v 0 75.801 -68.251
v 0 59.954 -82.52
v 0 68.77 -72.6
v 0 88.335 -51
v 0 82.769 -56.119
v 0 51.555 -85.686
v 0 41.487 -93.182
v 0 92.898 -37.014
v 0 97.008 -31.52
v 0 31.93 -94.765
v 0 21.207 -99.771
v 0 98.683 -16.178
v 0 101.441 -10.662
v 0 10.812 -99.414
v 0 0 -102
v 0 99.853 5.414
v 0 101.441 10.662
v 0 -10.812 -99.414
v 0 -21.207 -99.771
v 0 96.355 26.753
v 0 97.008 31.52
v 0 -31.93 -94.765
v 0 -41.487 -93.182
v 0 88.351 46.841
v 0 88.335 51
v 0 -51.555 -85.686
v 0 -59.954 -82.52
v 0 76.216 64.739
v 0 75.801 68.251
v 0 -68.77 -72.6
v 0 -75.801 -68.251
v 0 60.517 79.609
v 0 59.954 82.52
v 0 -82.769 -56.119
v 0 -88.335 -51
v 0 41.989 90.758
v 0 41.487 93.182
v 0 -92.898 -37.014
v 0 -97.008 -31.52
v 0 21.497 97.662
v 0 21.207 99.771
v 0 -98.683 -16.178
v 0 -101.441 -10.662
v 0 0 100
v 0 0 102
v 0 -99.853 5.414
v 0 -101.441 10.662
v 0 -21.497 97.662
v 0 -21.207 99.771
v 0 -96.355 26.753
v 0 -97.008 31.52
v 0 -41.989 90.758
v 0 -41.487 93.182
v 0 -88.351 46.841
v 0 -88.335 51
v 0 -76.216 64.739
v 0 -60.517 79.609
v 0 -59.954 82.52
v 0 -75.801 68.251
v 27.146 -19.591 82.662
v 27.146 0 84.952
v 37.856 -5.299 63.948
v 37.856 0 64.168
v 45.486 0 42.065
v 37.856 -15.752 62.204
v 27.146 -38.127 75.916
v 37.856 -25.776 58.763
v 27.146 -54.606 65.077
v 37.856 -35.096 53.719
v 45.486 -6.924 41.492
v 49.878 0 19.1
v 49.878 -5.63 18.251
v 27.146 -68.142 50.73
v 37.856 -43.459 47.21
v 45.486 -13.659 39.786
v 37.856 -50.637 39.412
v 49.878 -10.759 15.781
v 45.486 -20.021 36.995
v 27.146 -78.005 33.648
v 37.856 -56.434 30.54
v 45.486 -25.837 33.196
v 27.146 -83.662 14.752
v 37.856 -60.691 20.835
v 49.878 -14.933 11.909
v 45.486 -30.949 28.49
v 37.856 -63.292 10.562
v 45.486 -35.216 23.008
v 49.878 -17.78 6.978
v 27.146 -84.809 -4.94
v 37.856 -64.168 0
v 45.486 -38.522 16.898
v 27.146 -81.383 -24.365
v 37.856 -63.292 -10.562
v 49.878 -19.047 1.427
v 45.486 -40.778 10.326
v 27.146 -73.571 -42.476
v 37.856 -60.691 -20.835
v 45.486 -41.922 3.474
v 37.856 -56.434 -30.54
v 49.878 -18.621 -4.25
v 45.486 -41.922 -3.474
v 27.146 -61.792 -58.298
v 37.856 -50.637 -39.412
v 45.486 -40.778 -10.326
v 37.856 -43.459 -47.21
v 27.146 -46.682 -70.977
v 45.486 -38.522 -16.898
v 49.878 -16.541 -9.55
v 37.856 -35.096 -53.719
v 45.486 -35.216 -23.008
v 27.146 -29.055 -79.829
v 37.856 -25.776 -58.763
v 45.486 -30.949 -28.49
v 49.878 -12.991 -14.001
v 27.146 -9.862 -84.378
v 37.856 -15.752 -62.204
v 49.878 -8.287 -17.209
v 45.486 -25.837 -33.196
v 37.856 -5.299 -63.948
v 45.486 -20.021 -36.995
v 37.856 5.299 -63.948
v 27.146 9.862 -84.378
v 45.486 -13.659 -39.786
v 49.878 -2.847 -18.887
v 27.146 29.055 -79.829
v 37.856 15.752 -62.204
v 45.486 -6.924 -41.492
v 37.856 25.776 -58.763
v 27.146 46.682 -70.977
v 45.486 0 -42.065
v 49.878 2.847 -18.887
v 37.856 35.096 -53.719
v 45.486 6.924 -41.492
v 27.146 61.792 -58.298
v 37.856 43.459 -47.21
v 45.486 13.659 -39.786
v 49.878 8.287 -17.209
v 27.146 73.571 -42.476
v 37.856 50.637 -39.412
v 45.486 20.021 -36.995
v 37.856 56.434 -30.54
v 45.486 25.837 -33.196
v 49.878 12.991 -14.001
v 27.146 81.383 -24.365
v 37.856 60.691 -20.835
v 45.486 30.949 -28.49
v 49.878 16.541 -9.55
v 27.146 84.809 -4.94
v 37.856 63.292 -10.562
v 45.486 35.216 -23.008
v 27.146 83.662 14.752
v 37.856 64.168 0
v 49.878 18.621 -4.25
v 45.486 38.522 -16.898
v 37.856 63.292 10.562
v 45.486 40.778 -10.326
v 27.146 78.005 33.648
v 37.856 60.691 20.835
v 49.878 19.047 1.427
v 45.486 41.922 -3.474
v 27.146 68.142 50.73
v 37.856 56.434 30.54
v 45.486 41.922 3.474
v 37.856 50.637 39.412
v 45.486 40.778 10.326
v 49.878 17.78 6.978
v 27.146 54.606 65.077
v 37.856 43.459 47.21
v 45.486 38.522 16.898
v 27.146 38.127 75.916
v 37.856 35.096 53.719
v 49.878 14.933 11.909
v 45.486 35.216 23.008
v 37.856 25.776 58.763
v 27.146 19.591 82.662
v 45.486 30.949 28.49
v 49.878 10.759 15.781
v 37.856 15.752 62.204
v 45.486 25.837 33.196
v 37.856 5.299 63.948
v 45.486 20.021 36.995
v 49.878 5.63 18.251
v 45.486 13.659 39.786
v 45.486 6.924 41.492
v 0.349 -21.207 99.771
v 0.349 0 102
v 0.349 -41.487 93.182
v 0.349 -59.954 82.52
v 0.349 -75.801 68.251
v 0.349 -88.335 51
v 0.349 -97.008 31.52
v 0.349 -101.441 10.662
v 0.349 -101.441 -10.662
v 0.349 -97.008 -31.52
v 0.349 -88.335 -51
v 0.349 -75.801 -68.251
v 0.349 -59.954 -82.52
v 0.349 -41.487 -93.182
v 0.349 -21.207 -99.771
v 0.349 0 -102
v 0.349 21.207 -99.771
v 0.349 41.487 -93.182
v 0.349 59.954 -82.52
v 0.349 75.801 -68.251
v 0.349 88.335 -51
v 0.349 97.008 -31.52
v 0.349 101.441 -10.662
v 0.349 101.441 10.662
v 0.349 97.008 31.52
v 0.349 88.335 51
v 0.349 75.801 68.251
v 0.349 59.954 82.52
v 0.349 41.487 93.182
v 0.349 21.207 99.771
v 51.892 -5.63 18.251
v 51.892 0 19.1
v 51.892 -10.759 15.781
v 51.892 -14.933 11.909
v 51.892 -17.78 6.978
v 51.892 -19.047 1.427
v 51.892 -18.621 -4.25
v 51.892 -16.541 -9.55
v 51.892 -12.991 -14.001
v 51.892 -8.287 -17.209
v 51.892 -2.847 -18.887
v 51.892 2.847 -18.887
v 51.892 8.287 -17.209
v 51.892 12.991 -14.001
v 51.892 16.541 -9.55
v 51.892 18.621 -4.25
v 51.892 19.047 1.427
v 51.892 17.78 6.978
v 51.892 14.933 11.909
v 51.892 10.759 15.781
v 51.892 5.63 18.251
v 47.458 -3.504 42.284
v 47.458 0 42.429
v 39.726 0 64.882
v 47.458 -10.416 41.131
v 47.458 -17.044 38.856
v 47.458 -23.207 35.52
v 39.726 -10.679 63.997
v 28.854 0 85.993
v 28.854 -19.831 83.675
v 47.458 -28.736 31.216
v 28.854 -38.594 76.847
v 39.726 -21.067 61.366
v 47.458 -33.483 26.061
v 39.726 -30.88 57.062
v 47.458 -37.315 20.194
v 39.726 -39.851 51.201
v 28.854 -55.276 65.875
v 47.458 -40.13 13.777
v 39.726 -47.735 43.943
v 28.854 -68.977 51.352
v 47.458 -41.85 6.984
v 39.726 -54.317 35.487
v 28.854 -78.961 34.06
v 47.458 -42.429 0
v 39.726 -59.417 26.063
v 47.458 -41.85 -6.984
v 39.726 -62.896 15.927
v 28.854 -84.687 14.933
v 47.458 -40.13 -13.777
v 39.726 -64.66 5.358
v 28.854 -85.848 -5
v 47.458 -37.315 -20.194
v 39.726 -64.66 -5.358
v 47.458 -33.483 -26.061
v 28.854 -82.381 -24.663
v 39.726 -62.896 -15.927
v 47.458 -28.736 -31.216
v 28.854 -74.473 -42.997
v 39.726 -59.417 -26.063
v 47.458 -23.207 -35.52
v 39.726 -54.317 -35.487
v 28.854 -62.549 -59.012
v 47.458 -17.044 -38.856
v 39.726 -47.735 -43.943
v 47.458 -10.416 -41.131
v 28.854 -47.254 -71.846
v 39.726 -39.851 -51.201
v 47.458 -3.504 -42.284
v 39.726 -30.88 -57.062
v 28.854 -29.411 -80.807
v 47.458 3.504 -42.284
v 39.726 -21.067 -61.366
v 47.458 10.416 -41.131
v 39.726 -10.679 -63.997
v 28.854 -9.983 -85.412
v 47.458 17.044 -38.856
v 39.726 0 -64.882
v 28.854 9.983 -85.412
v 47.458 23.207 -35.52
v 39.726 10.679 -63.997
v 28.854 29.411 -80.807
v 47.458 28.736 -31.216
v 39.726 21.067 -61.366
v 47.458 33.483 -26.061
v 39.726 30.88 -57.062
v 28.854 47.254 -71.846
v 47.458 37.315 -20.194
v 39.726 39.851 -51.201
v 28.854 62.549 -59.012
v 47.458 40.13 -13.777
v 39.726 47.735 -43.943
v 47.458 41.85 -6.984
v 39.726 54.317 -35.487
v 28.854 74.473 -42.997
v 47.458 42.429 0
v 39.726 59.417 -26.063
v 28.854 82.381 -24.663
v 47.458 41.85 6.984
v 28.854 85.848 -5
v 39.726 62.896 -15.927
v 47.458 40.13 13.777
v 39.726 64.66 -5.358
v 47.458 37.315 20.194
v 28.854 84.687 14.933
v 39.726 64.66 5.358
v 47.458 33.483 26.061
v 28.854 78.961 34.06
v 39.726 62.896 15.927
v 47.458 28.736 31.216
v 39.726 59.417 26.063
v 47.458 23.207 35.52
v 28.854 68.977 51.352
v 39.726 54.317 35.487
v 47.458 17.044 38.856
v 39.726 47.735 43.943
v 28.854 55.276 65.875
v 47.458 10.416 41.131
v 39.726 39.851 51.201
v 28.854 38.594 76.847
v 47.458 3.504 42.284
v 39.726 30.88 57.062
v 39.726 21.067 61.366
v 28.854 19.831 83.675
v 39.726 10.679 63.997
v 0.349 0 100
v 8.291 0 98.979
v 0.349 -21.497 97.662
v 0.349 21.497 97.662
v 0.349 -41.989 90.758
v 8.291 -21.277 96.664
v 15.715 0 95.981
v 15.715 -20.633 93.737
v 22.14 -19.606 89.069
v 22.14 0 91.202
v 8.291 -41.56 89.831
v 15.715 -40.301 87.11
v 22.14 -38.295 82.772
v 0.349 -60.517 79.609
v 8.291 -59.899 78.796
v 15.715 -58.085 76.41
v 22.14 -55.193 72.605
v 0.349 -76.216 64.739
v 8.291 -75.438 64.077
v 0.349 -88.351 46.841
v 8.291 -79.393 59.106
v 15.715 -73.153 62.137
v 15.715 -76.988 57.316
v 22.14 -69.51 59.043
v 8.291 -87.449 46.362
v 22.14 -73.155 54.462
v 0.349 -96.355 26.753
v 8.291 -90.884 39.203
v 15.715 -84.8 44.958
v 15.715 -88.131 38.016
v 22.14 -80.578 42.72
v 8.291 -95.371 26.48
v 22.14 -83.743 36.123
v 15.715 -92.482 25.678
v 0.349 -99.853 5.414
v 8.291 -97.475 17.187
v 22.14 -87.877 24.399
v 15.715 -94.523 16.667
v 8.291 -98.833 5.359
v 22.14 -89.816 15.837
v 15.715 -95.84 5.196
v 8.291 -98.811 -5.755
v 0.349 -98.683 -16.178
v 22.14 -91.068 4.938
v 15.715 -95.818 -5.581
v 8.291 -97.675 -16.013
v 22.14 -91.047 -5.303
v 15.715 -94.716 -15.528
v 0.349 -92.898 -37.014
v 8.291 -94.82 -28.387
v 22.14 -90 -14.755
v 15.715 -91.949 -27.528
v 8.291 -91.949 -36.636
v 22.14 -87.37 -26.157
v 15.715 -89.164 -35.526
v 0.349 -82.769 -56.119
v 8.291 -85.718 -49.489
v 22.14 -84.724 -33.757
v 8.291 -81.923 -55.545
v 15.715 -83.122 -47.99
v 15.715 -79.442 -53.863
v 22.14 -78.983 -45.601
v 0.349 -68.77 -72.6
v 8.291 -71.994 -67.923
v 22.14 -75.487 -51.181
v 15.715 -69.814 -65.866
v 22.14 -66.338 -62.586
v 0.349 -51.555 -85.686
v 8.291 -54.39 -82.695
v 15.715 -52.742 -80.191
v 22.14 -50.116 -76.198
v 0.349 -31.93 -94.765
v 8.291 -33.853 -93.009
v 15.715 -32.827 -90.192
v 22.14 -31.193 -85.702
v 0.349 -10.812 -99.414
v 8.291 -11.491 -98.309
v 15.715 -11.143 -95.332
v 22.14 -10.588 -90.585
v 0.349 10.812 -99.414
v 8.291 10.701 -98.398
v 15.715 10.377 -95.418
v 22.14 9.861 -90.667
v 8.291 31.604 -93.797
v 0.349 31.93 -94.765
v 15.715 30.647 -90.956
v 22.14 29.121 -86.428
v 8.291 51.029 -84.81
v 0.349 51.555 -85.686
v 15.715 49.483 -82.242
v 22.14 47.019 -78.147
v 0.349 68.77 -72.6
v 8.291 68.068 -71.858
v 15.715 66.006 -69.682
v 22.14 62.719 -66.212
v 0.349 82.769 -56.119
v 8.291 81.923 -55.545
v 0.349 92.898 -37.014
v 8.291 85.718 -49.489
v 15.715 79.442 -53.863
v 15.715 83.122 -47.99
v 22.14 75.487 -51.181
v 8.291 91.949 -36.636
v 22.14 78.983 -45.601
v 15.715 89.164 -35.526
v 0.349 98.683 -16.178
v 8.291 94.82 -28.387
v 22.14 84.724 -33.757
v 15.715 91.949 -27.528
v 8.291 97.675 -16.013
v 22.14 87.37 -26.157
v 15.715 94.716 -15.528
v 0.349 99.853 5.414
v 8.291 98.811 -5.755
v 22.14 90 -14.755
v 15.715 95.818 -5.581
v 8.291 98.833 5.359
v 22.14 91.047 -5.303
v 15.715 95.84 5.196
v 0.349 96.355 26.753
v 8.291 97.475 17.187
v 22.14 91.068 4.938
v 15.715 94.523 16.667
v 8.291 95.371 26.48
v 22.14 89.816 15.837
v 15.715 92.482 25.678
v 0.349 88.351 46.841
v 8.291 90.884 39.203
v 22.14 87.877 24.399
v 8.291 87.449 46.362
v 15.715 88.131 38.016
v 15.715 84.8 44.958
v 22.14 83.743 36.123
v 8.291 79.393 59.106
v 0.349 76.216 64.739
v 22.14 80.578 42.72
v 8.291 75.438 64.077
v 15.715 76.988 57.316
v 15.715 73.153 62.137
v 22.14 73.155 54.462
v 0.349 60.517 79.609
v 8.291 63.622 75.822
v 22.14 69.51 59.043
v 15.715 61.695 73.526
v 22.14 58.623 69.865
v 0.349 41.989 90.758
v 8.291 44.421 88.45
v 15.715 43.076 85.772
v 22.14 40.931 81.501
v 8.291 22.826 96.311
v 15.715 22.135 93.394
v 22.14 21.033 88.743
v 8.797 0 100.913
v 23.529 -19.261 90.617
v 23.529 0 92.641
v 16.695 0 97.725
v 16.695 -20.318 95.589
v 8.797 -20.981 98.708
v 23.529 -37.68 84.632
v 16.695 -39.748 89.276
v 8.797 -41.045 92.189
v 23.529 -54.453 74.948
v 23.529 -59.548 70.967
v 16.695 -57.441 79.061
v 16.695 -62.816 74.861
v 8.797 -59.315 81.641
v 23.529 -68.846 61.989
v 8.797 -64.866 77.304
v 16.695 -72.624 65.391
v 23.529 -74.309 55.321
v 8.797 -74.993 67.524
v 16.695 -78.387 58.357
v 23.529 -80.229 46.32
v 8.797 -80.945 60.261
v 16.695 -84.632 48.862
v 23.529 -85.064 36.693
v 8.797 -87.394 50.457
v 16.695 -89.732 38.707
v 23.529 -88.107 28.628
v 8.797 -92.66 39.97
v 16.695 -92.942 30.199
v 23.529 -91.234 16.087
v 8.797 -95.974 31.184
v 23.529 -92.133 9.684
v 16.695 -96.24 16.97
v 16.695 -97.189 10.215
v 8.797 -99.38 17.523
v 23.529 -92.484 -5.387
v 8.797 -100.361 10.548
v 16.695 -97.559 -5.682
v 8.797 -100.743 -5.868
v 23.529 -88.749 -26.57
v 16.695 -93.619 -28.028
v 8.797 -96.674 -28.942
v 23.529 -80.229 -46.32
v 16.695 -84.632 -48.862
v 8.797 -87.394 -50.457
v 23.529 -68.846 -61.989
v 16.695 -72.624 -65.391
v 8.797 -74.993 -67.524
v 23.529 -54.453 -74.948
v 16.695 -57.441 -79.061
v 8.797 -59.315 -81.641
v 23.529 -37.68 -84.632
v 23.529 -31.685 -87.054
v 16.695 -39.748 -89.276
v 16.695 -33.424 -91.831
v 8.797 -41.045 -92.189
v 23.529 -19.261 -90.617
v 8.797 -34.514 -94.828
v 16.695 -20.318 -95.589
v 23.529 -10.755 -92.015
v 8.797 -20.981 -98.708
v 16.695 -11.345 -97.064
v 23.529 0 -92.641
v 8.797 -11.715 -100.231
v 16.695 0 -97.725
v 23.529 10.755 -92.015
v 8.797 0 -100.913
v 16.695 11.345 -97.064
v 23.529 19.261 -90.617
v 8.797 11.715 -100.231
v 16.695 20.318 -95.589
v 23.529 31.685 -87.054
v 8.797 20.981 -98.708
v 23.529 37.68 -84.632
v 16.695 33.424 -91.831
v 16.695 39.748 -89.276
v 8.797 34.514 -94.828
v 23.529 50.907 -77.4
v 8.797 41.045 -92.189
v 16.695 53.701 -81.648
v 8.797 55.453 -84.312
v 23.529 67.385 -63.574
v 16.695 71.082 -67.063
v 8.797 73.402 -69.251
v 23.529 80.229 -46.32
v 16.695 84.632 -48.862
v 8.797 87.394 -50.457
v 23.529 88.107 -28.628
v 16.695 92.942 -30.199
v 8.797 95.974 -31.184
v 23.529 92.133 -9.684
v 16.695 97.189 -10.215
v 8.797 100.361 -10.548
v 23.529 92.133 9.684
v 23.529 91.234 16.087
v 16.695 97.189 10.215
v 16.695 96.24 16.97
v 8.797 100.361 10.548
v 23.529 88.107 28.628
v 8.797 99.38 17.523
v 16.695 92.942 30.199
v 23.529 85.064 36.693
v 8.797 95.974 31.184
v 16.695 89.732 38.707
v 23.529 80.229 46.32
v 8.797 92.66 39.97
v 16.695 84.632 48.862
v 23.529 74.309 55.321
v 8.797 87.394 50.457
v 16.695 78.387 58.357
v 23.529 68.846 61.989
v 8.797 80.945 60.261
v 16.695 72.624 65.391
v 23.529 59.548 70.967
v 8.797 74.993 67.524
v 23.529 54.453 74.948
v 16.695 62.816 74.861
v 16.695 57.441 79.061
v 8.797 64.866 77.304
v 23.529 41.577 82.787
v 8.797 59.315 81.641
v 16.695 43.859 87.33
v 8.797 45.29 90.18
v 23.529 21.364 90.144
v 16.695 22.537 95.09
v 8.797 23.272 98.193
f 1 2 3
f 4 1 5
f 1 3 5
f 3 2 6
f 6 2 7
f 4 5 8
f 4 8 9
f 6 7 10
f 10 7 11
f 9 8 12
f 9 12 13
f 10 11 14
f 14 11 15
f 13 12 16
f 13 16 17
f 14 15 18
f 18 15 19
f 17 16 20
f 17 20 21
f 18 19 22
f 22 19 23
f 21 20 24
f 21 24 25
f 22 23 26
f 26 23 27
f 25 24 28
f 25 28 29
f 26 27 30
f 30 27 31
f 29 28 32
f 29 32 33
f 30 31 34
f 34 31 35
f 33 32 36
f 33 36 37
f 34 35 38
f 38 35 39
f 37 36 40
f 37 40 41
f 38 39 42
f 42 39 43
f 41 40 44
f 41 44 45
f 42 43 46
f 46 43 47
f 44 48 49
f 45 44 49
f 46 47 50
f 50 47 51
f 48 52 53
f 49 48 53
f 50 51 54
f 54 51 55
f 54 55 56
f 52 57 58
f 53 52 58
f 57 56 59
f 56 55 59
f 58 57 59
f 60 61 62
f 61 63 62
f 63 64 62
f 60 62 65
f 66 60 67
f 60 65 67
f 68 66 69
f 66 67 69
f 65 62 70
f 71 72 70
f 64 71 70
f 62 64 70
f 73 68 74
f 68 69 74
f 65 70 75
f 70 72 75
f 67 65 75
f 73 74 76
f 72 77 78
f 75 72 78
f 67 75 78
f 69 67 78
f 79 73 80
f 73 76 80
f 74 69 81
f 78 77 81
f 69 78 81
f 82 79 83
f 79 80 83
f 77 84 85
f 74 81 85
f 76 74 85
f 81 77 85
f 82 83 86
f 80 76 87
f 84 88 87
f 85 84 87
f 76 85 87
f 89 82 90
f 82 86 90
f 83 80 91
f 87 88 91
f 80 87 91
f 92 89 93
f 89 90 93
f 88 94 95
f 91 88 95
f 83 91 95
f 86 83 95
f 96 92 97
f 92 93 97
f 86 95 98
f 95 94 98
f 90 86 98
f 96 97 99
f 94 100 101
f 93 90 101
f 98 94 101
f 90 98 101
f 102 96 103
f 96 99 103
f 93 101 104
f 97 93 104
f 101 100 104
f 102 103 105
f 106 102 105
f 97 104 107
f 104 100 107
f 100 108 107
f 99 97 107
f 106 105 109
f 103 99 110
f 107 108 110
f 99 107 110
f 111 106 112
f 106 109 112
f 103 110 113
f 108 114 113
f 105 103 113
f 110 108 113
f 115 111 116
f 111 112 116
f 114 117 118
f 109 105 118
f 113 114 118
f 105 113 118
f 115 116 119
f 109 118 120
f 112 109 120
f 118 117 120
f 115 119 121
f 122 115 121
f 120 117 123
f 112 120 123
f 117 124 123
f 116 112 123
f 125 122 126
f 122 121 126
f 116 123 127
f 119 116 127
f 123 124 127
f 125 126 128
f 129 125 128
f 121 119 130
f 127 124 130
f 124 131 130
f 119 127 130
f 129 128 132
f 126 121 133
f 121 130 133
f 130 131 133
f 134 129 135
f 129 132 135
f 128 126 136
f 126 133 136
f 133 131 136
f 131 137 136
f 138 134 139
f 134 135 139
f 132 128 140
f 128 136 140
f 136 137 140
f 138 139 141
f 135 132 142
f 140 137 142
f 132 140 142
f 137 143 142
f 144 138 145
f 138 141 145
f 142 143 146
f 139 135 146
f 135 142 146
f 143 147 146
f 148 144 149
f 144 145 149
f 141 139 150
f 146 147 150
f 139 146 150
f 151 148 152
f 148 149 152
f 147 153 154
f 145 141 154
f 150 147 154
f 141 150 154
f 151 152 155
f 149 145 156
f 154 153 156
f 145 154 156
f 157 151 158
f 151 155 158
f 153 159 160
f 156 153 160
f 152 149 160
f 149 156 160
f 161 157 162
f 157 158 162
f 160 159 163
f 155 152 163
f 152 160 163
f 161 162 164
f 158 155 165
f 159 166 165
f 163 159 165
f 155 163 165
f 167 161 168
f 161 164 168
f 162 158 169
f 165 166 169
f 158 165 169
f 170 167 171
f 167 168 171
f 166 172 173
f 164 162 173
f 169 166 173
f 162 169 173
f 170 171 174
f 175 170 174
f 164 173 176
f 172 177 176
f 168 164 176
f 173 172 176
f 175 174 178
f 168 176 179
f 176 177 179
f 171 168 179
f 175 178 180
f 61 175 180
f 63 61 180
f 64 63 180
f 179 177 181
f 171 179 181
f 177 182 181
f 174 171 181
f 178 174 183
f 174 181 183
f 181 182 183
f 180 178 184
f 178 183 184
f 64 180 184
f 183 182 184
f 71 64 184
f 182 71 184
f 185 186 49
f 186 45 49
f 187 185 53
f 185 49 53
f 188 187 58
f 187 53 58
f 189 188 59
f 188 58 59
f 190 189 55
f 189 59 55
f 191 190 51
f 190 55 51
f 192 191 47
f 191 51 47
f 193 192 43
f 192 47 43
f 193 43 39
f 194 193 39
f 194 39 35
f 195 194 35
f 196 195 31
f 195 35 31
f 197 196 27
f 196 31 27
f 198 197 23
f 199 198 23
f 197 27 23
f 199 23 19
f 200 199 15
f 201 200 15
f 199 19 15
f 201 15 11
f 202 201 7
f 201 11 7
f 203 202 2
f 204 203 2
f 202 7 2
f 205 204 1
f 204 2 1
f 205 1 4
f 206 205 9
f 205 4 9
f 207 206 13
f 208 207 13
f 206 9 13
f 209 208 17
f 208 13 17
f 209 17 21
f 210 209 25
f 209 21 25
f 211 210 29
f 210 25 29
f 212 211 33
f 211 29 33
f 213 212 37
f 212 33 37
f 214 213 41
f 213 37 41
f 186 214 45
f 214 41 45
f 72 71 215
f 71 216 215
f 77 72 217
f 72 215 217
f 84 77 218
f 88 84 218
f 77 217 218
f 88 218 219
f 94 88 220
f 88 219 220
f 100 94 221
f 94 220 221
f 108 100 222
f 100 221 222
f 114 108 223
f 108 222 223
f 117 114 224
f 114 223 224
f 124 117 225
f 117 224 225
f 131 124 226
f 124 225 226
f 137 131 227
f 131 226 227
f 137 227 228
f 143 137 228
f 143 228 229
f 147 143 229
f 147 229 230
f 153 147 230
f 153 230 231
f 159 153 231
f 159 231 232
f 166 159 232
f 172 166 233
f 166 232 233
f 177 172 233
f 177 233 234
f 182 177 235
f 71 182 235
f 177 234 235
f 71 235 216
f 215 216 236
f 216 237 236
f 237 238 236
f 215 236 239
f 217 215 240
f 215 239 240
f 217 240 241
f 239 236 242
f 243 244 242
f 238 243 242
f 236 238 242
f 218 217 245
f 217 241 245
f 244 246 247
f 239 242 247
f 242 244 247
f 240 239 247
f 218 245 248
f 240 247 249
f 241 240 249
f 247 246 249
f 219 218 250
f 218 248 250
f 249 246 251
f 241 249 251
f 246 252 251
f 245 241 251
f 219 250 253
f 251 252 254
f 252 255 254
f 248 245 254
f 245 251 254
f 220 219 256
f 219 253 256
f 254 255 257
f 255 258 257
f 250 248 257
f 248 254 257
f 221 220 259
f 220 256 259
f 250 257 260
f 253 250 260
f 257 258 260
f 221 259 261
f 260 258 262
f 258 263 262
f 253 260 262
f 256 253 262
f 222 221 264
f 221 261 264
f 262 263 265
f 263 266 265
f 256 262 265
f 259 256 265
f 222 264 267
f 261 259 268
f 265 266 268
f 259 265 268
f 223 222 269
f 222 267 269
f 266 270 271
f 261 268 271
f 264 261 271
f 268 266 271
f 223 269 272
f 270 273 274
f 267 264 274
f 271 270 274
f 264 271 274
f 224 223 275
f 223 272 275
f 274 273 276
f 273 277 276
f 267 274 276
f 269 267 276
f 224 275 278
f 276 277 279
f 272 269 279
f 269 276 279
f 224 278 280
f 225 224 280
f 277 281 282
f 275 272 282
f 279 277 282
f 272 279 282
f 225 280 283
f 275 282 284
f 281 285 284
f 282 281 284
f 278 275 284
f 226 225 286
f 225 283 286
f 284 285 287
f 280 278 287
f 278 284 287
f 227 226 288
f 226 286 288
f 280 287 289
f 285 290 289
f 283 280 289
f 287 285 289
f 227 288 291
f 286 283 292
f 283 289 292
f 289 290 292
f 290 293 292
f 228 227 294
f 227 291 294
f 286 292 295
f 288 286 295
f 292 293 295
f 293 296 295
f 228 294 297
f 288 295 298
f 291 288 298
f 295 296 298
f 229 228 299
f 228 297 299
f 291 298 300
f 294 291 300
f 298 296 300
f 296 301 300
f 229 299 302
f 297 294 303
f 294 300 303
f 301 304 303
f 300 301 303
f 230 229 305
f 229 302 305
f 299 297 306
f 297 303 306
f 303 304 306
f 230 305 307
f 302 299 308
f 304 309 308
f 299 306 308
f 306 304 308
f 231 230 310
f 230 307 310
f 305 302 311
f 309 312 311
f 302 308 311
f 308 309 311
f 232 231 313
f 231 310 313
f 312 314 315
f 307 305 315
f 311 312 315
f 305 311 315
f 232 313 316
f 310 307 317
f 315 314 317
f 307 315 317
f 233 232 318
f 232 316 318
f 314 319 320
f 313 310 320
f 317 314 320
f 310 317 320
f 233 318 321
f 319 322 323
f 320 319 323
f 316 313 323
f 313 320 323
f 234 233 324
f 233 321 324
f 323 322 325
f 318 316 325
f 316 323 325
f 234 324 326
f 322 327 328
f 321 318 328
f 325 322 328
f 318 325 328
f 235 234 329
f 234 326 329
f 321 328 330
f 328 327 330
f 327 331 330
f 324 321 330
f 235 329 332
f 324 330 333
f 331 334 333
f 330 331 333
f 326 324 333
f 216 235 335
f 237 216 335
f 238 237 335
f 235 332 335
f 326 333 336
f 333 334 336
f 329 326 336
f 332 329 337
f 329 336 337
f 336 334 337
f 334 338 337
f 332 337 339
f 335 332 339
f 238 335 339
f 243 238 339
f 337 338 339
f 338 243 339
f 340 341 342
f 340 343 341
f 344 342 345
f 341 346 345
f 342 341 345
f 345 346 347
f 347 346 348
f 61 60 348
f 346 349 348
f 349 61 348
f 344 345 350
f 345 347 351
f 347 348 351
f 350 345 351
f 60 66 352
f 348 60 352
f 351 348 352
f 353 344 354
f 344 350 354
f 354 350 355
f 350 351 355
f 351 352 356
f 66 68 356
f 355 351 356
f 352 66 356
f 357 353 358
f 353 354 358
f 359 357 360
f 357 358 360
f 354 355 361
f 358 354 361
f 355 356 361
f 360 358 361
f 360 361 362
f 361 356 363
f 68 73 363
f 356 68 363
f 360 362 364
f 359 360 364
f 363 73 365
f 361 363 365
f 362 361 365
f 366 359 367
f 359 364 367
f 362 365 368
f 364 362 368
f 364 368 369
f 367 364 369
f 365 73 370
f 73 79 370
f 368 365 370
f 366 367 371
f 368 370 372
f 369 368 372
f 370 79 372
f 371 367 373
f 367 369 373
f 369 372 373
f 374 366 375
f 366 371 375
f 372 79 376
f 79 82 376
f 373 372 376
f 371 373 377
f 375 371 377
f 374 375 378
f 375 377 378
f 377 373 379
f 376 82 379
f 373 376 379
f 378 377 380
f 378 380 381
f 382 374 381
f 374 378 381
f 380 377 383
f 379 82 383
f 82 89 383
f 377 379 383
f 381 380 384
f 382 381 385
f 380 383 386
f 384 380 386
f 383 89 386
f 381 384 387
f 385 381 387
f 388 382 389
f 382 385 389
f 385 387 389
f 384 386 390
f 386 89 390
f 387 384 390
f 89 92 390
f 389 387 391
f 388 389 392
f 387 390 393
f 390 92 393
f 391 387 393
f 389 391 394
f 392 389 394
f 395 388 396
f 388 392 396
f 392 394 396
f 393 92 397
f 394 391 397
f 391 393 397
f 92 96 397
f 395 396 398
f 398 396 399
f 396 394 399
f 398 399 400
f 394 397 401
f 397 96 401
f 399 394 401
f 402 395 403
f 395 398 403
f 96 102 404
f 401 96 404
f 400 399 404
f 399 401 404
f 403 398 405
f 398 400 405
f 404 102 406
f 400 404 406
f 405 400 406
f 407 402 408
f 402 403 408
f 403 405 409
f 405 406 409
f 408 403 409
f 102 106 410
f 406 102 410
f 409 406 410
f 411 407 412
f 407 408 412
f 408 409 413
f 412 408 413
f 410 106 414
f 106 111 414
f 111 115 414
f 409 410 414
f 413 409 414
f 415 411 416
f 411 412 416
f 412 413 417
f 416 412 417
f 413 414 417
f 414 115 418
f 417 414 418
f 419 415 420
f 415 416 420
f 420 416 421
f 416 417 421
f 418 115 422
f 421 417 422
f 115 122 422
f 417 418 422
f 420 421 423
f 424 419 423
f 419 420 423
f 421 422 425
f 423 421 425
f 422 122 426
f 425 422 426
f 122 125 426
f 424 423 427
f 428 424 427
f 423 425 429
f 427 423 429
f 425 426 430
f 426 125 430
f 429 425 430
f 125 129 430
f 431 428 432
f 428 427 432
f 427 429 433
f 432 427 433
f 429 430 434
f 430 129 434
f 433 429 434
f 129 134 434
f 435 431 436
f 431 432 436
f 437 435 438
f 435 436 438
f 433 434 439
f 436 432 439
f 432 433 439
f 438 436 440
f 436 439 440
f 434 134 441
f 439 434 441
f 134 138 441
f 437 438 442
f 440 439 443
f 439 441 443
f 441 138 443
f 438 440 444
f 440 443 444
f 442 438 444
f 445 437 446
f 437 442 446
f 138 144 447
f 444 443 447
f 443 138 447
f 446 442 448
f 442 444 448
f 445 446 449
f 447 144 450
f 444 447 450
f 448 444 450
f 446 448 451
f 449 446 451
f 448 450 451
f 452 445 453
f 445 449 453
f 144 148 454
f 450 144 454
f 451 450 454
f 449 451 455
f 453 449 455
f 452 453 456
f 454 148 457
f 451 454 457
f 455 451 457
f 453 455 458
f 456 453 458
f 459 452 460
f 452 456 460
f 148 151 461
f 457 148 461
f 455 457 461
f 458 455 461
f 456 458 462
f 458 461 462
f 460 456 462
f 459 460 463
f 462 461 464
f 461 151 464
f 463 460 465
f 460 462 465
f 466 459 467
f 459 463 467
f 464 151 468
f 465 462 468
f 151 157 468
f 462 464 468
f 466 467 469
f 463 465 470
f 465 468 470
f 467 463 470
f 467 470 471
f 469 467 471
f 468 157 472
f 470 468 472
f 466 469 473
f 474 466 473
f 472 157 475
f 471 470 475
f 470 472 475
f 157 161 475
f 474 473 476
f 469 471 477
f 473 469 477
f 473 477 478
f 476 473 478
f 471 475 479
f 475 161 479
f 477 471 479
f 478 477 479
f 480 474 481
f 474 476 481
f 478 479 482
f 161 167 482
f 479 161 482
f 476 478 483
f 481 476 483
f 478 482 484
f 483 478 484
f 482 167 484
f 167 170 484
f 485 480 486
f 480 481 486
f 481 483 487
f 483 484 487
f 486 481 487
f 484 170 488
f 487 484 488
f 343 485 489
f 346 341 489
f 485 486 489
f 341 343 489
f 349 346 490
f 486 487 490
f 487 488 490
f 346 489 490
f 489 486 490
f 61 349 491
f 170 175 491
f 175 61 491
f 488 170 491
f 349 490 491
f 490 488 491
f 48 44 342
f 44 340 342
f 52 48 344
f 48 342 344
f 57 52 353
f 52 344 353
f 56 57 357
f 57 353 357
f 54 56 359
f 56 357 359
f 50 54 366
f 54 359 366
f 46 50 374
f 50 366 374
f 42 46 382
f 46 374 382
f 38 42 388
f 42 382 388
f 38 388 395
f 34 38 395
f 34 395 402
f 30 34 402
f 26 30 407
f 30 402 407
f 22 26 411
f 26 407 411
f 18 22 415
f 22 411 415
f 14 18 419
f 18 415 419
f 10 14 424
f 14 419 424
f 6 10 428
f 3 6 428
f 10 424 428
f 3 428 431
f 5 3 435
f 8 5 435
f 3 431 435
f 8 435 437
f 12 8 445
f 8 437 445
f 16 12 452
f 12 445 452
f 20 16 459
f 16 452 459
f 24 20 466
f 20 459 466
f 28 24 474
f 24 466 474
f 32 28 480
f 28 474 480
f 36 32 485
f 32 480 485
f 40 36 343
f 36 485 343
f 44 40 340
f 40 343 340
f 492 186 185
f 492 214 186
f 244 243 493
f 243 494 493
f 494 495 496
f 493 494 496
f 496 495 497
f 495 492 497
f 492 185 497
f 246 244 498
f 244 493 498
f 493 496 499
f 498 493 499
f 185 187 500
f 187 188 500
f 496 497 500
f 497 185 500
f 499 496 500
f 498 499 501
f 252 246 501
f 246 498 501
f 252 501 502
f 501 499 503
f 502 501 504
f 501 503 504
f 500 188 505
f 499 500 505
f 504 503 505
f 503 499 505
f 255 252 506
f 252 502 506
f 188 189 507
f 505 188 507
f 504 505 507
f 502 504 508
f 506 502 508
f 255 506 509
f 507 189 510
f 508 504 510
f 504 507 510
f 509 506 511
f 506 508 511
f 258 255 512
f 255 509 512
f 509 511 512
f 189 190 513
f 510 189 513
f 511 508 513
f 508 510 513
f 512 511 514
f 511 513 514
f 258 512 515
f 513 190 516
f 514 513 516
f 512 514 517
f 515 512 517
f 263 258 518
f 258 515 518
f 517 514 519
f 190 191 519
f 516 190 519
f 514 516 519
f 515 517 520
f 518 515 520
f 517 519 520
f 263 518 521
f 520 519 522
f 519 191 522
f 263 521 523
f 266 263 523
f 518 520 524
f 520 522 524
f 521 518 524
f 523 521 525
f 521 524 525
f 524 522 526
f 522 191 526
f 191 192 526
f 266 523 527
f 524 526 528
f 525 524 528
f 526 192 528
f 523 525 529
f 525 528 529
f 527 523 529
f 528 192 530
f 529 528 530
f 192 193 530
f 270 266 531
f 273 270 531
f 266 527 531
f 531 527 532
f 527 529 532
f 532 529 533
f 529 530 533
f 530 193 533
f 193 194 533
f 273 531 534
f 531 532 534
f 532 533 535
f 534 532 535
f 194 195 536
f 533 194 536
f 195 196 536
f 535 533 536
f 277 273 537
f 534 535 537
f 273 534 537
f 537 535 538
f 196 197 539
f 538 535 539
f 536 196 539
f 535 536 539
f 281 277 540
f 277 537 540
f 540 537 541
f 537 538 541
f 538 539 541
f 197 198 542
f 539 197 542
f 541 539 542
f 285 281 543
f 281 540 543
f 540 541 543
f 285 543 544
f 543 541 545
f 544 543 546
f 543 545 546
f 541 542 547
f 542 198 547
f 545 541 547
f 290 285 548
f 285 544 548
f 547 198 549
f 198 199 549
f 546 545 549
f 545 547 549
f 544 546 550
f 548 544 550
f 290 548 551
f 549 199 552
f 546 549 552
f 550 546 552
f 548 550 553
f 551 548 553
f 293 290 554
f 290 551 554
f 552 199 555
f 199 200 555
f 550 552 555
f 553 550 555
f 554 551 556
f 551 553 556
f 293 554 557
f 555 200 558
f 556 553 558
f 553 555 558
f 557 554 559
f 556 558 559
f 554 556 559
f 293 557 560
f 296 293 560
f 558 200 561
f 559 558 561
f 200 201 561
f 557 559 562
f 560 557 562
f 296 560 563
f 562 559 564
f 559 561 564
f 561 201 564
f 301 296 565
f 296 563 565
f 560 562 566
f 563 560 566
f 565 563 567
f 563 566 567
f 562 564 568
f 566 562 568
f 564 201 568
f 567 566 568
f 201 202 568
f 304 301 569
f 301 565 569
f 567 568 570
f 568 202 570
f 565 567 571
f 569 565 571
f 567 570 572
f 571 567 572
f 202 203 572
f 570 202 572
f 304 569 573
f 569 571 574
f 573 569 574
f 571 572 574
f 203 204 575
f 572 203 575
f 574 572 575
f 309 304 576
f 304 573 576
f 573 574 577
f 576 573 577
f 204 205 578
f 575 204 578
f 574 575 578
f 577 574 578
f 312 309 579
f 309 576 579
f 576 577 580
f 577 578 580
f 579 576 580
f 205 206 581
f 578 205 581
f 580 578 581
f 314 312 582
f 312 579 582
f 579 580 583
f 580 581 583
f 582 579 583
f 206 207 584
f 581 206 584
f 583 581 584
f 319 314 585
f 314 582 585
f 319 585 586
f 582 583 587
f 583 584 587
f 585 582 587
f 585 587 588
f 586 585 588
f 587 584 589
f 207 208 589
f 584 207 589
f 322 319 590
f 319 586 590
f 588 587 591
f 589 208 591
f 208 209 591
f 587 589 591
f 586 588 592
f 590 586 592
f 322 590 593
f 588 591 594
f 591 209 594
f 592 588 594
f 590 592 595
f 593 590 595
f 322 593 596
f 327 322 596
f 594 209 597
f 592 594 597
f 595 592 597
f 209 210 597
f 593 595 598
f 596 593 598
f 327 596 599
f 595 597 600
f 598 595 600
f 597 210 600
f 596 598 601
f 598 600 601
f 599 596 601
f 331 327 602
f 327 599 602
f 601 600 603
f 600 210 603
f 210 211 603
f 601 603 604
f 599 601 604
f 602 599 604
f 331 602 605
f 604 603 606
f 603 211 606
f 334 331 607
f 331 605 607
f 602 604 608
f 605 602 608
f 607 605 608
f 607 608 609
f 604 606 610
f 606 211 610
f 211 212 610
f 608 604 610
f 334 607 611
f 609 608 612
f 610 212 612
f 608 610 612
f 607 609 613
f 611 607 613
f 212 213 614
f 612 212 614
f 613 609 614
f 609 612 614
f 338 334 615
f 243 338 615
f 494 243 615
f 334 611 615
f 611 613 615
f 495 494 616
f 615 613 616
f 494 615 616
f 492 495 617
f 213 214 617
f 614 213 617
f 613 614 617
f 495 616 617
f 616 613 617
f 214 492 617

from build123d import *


with BuildPart() as part:
    # Эскиз1 → Повернуть1 (revolve)
    with BuildSketch(Plane.XY):
        with BuildLine():
            Line((0.348765499, 102), (0, 102))
            Line((0, 102), (0, 100))
            Line((0, 100), (0.348765499, 100))
            ThreePointArc((0.348765499, 100), (15.715348338, 95.980731584), (27.146090618, 84.952380952))
            ThreePointArc((27.146090618, 84.952380952), (42.06705822, 53.253307392), (49.87846865, 19.1))
            Line((49.87846865, 19.1), (51.892138751, 19.1))
            ThreePointArc((51.892138751, 19.1), (43.995996323, 53.794523258), (28.853763297, 85.993464052))
            ThreePointArc((28.853763297, 85.993464052), (16.694591362, 97.724601734), (0.348765499, 102))
        make_face()
    revolve(axis=Axis((0, 0, 0), (1, 0, 0)))


solid = part.part
